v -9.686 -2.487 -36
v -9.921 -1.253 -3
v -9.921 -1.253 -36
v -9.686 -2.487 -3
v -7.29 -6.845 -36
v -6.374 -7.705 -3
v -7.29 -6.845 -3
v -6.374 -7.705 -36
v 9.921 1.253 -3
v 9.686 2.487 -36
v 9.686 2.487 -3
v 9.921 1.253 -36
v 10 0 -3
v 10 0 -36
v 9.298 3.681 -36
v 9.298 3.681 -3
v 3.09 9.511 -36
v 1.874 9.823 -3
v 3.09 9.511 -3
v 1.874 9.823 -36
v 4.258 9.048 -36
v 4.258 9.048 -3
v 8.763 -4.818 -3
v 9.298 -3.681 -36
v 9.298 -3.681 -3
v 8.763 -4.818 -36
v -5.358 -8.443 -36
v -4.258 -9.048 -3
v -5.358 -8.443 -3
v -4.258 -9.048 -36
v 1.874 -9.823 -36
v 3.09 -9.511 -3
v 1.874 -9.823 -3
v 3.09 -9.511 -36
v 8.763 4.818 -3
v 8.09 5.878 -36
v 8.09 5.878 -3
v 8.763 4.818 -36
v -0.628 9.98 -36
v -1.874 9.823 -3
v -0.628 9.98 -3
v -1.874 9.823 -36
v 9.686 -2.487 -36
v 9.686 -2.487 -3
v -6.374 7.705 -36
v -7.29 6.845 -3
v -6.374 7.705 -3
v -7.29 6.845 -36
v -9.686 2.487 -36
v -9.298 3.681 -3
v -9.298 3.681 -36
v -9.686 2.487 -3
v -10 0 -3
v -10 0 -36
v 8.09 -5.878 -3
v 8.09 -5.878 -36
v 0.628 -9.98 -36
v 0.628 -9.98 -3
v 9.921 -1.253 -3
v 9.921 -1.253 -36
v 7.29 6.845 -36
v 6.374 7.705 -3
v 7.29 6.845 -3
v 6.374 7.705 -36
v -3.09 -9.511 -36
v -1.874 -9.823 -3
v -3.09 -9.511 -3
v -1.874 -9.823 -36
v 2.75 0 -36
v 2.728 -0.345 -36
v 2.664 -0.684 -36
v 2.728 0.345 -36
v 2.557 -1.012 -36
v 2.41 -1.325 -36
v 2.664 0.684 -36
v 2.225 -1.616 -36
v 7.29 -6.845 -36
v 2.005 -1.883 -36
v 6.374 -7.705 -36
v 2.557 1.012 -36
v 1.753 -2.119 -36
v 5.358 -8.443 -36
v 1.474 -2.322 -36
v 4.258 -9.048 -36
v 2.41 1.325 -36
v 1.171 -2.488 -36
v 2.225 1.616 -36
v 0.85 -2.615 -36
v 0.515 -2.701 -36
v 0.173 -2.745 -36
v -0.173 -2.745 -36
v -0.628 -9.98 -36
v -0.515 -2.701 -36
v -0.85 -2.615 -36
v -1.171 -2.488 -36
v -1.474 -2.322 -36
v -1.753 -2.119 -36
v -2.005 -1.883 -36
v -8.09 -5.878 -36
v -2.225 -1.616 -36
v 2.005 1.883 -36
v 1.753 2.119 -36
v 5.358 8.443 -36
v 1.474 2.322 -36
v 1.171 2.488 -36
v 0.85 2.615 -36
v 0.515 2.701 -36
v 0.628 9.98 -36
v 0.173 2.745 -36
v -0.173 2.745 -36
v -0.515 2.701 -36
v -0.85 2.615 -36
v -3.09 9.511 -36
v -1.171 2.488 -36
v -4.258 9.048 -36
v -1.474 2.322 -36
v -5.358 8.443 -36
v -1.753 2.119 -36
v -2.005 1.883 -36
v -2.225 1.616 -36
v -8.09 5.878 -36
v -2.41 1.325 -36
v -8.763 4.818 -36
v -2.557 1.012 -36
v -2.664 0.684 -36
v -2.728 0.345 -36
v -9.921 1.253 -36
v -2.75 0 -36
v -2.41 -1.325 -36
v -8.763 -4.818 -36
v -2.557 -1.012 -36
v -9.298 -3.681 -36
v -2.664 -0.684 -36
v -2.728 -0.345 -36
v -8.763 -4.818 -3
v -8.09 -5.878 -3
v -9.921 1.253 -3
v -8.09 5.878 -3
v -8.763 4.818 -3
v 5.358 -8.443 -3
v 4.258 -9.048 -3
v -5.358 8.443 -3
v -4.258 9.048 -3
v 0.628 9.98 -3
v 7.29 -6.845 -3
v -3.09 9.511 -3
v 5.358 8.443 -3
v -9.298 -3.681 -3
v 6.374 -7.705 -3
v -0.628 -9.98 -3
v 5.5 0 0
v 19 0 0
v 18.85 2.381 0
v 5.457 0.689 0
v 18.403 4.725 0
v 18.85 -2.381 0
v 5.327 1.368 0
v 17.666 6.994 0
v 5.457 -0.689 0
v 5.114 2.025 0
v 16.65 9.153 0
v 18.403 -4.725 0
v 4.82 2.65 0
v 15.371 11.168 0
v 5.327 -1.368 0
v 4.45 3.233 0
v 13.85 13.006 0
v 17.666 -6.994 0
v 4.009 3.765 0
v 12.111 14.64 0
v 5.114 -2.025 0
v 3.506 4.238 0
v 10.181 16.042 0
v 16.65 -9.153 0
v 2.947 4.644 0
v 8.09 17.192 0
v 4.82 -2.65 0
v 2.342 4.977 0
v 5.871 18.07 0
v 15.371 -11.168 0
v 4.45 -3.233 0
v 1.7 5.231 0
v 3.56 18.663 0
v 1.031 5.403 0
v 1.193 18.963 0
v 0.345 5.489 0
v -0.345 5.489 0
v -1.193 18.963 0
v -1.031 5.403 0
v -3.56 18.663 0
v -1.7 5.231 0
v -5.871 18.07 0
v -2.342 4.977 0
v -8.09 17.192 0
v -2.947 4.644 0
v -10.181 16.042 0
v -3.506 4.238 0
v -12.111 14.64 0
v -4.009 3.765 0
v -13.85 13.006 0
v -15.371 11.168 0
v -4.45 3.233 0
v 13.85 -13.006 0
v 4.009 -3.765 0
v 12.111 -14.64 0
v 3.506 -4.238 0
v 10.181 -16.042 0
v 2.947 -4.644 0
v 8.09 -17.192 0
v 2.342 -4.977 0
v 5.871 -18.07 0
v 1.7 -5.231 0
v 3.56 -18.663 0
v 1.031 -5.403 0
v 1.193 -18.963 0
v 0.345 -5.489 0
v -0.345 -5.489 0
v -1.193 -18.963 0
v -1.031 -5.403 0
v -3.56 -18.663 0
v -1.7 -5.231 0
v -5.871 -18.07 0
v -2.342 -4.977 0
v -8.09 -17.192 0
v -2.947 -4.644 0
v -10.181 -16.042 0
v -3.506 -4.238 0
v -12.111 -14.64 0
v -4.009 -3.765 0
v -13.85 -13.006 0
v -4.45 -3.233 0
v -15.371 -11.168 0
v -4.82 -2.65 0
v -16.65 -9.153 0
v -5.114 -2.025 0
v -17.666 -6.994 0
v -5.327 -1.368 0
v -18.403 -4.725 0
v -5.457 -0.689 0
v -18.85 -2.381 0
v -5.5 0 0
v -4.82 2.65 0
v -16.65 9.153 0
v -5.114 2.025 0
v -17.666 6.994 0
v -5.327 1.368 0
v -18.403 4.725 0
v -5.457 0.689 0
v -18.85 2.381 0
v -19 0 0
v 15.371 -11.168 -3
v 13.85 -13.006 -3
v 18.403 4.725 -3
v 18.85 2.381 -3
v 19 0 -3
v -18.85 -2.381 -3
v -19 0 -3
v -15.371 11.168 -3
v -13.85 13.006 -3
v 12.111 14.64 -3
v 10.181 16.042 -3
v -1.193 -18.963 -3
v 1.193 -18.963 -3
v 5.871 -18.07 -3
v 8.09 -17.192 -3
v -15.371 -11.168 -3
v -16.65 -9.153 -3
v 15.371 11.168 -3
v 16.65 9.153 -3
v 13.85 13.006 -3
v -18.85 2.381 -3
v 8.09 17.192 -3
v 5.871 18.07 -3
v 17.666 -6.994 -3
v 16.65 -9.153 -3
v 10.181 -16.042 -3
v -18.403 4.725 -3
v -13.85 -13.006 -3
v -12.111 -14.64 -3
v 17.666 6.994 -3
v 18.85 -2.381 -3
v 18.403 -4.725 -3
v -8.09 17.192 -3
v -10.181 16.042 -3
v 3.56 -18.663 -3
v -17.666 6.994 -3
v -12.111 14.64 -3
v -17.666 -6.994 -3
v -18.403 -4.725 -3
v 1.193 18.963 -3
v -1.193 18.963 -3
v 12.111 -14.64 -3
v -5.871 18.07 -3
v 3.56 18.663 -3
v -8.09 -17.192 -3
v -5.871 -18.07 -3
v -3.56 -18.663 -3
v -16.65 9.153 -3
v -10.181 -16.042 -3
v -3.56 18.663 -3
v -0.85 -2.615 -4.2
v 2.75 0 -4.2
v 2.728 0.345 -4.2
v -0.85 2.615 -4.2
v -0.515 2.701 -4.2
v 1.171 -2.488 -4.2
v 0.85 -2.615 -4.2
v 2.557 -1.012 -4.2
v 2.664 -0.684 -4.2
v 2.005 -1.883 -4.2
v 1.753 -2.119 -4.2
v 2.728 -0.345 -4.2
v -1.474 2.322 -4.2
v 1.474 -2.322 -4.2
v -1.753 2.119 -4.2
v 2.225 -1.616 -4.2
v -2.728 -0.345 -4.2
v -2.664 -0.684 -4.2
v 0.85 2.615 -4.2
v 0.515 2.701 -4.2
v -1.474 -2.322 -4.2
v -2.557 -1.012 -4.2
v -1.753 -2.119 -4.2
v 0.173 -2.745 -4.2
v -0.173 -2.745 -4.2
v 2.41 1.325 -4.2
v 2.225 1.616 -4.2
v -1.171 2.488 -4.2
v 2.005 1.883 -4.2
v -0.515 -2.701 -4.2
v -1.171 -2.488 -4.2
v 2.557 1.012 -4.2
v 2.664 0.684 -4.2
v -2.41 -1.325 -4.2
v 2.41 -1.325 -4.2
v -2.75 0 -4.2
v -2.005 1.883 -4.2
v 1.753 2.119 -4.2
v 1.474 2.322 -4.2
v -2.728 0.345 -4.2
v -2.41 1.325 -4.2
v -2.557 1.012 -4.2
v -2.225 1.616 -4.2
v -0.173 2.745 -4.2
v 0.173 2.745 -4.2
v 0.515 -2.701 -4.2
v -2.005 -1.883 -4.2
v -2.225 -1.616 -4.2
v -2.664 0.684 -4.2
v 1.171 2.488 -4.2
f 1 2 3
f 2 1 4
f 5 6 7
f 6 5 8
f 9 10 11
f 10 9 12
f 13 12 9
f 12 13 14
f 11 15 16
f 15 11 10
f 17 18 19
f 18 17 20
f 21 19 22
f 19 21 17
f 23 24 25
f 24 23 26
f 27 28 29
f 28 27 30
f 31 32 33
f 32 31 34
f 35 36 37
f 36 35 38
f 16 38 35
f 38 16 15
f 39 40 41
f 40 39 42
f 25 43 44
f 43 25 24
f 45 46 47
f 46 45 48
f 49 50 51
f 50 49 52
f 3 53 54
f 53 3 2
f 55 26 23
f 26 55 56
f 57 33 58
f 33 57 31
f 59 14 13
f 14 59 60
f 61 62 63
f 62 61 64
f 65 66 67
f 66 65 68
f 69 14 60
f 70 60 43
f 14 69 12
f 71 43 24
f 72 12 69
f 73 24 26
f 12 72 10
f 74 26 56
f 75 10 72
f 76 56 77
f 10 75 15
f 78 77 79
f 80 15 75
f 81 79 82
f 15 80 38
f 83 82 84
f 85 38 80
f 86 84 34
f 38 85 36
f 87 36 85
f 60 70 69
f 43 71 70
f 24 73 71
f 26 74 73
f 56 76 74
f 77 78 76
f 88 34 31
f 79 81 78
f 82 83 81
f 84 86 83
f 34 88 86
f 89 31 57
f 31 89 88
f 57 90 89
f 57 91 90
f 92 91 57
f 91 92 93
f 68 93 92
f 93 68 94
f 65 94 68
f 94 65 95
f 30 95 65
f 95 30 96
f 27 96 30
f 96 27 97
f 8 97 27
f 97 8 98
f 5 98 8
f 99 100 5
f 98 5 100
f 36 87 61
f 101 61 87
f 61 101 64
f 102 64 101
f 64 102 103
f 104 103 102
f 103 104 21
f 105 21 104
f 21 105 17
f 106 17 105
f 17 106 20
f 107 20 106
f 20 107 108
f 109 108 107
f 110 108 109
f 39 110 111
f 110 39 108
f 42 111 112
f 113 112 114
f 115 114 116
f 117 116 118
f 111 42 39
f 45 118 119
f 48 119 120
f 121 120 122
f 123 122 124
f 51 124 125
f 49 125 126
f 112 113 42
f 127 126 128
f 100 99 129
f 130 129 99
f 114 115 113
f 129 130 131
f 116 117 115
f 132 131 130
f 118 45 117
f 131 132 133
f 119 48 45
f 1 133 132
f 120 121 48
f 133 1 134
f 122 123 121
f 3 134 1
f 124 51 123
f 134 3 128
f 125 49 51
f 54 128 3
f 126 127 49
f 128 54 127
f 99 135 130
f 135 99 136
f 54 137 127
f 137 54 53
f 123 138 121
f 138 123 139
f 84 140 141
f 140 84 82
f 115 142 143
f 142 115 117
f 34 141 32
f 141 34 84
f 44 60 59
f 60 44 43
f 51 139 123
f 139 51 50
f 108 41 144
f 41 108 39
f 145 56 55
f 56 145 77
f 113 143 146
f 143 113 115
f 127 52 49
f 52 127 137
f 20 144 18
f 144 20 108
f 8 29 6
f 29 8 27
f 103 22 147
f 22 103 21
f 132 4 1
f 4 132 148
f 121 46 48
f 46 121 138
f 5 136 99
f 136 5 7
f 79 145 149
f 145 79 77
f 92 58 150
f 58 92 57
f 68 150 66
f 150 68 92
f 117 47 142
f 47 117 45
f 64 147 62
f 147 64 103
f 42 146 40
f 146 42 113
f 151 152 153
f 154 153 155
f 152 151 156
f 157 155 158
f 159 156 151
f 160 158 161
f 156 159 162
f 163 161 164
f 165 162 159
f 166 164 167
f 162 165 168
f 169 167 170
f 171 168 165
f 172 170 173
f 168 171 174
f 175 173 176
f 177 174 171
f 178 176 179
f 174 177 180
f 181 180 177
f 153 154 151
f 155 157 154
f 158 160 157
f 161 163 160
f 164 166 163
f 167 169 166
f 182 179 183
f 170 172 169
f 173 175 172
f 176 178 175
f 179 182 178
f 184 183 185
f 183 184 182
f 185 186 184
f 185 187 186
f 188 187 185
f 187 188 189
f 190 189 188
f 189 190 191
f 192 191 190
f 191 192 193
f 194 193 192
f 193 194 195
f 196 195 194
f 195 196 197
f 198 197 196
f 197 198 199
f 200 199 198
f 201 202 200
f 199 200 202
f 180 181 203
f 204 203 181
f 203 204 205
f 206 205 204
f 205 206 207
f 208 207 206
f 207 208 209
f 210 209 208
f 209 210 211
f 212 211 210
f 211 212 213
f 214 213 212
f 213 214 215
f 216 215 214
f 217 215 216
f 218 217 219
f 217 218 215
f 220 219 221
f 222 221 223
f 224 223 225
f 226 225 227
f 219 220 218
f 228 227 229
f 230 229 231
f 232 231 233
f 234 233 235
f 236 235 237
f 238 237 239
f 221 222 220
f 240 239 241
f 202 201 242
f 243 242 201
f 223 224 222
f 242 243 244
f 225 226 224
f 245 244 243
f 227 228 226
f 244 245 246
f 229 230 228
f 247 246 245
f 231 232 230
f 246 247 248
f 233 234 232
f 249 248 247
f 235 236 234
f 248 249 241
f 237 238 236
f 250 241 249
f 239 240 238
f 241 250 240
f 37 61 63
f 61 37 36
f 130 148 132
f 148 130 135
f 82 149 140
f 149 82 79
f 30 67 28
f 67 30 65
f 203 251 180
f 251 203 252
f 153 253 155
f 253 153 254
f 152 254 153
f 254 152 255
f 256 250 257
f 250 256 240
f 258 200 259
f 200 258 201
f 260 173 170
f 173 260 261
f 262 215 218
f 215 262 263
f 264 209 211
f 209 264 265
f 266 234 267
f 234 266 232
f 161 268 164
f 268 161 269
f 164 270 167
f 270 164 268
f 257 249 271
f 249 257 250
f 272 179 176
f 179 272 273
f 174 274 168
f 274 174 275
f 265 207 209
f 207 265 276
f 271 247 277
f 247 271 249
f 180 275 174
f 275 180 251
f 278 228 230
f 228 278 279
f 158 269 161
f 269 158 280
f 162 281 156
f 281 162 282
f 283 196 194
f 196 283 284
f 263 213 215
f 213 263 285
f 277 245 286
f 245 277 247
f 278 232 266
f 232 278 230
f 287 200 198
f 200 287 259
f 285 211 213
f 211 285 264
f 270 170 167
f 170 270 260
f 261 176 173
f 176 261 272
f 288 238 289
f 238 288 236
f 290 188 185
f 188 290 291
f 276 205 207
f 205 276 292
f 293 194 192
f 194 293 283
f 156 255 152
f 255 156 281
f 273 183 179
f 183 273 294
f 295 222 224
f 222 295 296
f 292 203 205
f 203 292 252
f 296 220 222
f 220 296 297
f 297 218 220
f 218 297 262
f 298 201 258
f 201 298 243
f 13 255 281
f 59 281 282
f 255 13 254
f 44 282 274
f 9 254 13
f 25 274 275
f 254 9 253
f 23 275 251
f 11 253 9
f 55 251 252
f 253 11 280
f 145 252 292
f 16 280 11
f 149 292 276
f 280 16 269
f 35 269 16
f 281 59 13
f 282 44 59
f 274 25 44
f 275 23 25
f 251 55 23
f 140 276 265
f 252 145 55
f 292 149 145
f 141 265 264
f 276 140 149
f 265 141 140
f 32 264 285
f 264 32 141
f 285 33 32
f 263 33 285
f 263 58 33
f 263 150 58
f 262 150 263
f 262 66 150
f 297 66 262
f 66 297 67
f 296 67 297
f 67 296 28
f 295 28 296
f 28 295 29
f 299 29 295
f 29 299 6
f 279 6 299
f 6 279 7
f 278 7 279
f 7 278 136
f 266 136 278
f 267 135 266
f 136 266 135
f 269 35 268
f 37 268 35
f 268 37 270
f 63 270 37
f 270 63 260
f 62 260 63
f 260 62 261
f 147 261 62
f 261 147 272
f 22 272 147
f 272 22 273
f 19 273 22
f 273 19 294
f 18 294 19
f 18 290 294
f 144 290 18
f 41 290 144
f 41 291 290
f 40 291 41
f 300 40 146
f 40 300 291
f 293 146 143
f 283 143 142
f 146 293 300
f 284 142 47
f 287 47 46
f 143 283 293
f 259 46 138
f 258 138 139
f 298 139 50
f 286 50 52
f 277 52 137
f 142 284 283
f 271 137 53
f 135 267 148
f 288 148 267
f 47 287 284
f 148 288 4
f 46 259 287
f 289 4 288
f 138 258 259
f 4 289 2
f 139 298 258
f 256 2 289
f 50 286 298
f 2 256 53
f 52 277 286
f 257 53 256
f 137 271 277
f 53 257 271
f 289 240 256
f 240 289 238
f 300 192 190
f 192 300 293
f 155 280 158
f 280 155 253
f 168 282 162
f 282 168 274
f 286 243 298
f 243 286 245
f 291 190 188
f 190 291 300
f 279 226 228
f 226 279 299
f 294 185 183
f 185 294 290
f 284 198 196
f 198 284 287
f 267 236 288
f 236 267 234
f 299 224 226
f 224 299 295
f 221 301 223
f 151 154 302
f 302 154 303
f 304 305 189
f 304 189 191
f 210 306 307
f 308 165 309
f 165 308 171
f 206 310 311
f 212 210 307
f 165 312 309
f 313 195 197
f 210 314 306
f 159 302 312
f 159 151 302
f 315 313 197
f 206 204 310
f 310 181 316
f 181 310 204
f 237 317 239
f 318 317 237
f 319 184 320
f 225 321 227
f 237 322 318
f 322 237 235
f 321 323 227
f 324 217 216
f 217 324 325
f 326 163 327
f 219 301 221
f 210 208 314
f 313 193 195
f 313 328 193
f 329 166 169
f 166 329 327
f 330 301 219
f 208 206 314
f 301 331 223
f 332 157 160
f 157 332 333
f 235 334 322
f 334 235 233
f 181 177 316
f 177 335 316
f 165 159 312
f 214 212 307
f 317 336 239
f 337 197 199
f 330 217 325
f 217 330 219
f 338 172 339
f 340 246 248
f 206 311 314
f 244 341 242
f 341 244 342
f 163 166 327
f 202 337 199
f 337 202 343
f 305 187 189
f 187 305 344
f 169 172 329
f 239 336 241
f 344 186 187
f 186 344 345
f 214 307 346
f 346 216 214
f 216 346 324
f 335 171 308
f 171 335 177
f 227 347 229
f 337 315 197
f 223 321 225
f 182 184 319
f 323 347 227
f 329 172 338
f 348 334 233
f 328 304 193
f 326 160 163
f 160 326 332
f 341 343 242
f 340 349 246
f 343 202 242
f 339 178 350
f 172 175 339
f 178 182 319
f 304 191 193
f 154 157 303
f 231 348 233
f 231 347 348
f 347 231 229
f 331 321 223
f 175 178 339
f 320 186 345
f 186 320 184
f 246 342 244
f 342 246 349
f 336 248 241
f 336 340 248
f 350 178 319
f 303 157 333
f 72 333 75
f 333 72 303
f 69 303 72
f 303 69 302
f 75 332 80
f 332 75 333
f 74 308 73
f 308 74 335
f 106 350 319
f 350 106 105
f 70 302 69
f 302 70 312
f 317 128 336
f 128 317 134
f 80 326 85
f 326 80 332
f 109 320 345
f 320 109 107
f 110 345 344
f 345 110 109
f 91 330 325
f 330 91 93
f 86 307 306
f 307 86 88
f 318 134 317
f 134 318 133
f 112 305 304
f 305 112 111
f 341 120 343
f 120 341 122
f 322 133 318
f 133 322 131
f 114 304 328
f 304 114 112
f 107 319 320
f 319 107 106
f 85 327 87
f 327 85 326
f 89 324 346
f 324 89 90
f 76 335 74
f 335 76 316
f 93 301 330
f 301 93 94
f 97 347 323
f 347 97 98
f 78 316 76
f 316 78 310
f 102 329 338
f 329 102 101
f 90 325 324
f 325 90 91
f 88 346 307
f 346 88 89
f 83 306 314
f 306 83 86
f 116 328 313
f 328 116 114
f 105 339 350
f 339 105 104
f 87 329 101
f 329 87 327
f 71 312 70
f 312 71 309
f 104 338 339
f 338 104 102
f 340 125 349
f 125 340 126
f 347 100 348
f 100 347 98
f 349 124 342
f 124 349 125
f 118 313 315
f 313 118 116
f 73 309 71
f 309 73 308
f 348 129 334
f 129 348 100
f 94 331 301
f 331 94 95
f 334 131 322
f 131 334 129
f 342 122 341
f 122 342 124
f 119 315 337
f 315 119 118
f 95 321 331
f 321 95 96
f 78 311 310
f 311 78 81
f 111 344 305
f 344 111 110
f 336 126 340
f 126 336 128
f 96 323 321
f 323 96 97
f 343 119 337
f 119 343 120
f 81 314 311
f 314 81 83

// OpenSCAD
$fn = 50;


difference() {
	union() {
		translate(v = [0, 0, -36.0000000000]) {
			cylinder(h = 36, r = 10.0000000000);
		}
		translate(v = [0, 0, -3.0000000000]) {
			cylinder(h = 3, r = 19.0000000000);
		}
	}
	union() {
		translate(v = [0, 0, 0]) {
			rotate(a = [0, 0, 0]) {
				difference() {
					union() {
						#translate(v = [0, 0, -36.0000000000]) {
							cylinder(h = 36, r = 2.2500000000);
						}
						#translate(v = [0, 0, -4.2000000000]) {
							cylinder(h = 4.2000000000, r1 = 2.7500000000, r2 = 5.5000000000);
						}
						#translate(v = [0, 0, -36.0000000000]) {
							cylinder(h = 36, r = 2.7500000000);
						}
						#translate(v = [0, 0, -36.0000000000]) {
							cylinder(h = 36, r = 2.2500000000);
						}
					}
					union();
				}
			}
		}
	}
}
